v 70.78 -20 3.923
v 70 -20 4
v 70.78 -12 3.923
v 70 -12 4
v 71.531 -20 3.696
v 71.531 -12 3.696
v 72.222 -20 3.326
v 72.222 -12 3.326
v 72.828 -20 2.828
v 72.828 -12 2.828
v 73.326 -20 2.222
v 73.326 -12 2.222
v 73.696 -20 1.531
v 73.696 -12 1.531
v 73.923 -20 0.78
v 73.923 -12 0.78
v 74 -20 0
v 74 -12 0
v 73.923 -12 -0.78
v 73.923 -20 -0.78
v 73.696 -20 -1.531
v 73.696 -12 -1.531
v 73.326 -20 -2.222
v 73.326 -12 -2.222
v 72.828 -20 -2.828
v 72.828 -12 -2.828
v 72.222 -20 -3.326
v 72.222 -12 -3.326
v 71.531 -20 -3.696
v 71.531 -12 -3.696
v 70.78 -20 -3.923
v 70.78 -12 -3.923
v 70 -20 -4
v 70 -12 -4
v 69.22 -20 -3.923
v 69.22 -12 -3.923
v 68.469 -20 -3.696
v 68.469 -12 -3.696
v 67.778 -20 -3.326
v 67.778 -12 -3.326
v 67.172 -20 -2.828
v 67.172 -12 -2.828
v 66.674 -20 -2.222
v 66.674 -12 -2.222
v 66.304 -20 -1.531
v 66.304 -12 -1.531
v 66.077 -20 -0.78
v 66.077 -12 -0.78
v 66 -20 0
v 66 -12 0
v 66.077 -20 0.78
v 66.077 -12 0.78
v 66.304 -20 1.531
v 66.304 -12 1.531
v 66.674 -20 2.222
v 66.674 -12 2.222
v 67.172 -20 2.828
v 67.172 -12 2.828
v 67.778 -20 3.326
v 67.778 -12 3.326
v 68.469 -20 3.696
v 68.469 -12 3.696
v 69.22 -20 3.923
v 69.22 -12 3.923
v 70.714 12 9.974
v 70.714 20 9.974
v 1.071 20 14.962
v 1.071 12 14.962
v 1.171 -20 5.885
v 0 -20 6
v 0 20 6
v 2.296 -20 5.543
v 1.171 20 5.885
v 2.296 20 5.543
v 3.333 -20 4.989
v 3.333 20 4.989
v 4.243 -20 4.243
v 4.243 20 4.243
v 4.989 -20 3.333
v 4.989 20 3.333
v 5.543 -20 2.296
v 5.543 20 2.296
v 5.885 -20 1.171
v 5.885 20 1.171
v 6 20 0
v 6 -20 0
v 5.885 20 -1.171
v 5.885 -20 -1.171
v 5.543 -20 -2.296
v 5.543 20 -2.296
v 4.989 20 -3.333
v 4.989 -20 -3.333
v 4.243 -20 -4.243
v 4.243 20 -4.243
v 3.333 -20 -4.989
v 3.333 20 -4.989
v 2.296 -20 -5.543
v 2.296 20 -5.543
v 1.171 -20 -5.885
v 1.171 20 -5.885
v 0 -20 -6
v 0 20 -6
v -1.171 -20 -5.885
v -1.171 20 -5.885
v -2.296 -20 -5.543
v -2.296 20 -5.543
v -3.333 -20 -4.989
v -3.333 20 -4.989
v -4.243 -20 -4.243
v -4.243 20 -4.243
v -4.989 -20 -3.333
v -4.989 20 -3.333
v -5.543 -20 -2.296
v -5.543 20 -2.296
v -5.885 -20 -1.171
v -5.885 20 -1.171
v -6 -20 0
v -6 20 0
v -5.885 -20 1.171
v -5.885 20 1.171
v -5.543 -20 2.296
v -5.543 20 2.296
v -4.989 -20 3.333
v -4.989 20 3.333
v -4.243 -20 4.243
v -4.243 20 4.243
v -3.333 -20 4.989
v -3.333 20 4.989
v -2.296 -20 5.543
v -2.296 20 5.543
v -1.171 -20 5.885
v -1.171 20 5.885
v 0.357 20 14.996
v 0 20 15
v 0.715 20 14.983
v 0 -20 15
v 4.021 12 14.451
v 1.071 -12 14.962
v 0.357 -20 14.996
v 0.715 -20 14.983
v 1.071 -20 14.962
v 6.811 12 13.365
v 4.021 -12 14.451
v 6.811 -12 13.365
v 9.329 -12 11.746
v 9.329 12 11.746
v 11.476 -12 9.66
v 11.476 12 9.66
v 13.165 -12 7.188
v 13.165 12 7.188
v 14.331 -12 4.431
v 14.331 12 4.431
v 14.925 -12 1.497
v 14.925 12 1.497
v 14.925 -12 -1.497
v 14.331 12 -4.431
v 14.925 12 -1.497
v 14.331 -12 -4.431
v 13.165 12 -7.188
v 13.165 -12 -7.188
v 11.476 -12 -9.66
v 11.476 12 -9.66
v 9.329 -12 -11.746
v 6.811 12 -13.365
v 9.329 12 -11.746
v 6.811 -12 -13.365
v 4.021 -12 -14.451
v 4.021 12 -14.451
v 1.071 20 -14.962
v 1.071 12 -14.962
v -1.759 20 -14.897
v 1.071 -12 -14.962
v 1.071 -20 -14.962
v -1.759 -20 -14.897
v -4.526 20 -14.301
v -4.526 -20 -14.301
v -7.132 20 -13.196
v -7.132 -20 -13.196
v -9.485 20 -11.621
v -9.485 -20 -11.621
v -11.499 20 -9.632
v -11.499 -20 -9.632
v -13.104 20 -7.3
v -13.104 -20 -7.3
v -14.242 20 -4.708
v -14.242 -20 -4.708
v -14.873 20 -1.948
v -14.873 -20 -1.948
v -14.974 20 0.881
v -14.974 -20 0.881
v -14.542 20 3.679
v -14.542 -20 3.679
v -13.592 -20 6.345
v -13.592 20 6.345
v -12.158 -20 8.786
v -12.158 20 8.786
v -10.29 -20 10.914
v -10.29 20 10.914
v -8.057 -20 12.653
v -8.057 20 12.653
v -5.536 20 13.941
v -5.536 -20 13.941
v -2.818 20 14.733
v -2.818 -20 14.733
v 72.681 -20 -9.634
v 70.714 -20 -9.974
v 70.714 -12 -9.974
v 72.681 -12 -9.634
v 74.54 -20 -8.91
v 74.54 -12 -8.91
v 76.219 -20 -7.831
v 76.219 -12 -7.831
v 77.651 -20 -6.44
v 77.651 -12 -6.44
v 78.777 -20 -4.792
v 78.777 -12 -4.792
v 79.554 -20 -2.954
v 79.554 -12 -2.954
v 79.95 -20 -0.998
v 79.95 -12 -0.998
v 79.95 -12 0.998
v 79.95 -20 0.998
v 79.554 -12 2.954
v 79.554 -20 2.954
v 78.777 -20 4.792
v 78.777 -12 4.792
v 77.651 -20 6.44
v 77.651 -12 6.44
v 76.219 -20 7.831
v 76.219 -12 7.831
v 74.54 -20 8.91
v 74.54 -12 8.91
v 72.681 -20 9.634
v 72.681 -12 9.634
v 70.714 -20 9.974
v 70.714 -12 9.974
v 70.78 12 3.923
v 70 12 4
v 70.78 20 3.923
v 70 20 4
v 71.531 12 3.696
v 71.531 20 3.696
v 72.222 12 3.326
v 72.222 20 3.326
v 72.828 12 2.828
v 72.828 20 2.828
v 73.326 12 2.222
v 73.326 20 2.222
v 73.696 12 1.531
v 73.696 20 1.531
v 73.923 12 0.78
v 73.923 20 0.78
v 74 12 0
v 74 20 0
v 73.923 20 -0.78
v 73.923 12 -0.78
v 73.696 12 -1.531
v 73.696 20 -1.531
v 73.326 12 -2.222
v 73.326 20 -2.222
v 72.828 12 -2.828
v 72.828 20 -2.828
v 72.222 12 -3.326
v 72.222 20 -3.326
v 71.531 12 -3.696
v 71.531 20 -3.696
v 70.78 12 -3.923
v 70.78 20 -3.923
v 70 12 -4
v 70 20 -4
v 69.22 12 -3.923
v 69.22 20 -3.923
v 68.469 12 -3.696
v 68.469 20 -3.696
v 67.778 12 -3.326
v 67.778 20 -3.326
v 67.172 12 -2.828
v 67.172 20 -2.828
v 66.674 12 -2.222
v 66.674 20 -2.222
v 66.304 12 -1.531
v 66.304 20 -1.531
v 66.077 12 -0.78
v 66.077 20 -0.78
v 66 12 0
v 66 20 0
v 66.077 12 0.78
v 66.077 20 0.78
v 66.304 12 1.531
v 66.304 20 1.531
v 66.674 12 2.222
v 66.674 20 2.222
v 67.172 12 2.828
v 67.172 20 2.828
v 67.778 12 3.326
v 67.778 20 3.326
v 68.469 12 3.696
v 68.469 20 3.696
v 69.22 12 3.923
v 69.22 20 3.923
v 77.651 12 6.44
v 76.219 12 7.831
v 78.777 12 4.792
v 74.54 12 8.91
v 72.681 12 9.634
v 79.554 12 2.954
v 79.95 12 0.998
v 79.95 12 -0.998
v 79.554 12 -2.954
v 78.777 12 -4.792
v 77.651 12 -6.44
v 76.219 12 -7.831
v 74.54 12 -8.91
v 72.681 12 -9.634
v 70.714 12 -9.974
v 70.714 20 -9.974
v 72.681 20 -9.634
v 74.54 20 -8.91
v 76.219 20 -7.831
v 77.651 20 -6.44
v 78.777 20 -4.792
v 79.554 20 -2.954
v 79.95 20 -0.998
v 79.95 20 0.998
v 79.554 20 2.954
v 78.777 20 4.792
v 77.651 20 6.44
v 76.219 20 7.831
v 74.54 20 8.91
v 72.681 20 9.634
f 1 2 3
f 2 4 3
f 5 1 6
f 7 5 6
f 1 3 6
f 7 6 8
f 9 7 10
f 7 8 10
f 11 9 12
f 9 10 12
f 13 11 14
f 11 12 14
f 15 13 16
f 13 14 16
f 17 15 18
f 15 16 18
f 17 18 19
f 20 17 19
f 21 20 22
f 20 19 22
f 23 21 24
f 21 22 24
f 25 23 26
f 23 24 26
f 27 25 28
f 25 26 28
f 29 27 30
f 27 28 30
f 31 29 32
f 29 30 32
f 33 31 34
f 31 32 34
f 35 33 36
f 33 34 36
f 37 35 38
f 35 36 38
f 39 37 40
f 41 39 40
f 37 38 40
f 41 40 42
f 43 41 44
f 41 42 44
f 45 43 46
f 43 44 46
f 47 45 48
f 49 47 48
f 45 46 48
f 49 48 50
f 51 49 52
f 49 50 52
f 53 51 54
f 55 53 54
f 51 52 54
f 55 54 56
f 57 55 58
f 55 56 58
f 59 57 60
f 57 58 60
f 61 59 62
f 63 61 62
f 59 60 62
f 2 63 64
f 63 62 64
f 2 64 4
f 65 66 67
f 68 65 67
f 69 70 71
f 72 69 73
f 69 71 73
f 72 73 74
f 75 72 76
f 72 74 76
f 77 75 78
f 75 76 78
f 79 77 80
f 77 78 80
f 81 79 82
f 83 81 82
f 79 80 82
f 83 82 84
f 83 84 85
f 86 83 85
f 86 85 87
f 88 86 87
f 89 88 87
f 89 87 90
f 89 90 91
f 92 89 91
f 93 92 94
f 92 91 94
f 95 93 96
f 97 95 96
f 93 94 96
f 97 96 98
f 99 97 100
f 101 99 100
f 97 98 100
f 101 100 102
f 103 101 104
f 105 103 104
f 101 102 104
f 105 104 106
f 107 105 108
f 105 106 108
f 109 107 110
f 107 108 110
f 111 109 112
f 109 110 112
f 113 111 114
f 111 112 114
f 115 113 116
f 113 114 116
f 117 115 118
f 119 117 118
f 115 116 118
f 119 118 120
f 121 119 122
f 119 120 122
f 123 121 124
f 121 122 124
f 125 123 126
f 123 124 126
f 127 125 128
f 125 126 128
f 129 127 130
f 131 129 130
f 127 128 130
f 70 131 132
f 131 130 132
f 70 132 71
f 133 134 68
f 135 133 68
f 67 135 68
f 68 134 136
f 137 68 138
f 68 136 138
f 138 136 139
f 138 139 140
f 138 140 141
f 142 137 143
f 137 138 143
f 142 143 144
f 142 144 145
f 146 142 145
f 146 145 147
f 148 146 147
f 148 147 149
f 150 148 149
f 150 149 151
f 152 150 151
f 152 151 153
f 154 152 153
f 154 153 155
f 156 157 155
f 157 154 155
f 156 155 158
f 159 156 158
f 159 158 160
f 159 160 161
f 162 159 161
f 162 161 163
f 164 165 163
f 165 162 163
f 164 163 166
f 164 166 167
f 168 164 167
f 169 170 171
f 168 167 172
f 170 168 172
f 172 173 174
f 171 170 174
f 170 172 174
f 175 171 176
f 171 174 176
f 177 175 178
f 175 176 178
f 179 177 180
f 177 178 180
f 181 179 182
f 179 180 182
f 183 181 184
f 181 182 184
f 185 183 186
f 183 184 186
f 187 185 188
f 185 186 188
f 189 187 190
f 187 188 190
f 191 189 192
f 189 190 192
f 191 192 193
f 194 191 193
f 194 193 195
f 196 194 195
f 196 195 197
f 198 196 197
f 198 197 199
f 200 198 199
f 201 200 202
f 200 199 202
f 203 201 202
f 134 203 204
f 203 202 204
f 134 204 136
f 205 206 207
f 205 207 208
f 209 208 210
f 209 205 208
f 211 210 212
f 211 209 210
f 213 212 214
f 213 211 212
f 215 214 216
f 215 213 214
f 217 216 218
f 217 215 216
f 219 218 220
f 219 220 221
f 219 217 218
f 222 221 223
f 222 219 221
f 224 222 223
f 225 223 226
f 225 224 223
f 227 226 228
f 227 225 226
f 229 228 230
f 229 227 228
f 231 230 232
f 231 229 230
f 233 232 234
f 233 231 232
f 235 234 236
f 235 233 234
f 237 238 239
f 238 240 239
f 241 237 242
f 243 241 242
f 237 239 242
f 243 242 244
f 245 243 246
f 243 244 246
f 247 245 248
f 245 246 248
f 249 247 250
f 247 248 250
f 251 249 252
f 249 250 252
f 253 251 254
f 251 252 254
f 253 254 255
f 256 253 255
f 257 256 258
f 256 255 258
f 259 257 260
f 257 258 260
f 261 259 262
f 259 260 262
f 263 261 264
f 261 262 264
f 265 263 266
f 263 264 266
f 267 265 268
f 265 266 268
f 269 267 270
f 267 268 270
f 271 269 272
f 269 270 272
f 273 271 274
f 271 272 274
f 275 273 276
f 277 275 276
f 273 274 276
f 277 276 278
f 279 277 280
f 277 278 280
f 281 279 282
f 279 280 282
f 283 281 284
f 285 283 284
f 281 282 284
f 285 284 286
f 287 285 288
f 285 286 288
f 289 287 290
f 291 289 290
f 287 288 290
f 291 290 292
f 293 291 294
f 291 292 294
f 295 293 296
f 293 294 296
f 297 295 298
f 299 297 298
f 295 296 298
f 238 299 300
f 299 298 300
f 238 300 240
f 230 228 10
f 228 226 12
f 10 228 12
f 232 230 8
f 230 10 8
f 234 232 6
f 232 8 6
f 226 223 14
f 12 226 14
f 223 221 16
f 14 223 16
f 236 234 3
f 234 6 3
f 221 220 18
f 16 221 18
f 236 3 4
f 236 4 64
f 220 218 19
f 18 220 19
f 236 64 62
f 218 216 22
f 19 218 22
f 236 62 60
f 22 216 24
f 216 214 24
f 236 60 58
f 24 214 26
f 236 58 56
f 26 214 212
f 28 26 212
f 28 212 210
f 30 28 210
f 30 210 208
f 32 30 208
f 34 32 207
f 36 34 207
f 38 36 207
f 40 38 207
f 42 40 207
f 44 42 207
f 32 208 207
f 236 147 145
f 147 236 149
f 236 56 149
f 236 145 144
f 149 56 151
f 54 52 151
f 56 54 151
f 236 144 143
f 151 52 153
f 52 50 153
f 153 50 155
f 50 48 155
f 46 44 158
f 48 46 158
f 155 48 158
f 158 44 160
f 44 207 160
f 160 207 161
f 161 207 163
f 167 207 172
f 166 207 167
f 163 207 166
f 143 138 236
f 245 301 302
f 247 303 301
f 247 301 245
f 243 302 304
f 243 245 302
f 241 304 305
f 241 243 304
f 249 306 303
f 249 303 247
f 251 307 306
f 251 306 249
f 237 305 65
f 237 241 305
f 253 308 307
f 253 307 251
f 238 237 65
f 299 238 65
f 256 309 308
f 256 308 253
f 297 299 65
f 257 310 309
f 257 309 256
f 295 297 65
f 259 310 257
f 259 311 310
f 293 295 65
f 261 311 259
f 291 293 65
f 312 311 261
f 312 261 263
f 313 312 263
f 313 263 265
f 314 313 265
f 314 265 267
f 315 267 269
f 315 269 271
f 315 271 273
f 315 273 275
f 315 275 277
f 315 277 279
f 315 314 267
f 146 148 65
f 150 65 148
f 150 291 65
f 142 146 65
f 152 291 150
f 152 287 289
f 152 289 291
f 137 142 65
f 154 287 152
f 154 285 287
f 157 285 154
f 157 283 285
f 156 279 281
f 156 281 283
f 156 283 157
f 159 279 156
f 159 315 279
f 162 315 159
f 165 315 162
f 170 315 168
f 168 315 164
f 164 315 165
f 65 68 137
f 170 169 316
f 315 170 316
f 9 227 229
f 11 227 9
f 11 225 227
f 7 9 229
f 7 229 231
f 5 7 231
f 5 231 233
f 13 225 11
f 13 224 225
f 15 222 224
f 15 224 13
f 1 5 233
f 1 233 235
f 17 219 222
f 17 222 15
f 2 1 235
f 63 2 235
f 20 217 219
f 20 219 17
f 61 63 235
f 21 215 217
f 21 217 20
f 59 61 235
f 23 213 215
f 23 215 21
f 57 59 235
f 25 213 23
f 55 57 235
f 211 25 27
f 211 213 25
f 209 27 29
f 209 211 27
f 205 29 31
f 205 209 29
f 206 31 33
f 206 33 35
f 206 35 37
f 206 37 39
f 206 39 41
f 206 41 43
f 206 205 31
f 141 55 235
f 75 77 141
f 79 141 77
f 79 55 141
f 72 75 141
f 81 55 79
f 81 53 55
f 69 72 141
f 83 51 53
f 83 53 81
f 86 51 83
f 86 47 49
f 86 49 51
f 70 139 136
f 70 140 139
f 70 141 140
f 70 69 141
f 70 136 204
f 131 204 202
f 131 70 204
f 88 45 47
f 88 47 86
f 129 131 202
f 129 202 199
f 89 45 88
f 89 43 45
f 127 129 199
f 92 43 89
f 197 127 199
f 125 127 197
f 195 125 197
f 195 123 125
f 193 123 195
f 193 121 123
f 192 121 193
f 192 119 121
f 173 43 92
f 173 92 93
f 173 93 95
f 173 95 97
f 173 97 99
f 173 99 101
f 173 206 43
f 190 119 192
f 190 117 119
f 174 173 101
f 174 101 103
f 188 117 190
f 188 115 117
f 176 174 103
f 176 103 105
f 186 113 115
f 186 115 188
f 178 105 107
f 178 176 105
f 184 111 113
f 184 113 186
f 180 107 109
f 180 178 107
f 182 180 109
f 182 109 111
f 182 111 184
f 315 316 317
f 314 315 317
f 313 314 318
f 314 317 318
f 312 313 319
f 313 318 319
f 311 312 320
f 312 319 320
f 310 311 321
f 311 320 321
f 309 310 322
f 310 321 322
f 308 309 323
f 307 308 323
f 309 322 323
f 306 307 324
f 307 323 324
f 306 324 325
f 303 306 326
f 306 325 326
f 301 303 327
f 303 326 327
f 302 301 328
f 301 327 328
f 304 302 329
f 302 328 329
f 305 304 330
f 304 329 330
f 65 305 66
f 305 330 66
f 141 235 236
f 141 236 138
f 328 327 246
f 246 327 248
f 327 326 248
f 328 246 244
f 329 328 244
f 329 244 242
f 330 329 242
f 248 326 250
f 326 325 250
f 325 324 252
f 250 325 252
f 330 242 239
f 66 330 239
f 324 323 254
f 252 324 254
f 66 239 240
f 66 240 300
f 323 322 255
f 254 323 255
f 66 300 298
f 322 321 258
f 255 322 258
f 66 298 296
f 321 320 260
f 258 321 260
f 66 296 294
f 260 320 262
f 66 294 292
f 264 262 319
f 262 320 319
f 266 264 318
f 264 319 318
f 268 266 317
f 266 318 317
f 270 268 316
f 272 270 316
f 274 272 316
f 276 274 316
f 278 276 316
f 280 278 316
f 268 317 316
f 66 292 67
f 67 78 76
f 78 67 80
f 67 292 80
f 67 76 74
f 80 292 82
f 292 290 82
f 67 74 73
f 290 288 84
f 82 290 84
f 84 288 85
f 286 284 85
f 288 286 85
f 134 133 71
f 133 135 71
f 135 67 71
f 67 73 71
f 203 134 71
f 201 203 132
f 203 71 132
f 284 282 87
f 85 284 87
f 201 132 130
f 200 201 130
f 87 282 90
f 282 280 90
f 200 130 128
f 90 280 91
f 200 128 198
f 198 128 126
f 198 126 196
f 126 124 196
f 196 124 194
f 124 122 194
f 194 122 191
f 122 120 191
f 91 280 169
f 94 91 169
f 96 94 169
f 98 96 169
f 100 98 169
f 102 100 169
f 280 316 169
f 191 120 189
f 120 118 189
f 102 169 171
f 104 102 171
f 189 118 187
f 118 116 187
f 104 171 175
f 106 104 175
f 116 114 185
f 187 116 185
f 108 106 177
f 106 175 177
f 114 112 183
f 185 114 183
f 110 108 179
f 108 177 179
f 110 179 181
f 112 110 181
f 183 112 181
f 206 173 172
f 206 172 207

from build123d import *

# Parameters (mm, degrees)
SKETCH_1_R          = 15
EXTRUDE_1_DEPTH     = 40
EXTRUDE_2_DEPTH     = 8
SKETCH_3_R          = 6
CUT_EXTRUDE_1_DEPTH = 96
SKETCH_4_R          = 4
CUT_EXTRUDE_2_DEPTH = 96


with BuildPart() as part:
    # 草图1 → 凸台-拉伸1 (new body)
    with BuildSketch(Plane(origin=(0, -20, 0), x_dir=(1, 0, 0), z_dir=(0, 1, 0))):
        with Locations(Location((0, 0, 0), (0, 0, 270))):
            Circle(SKETCH_1_R)
    extrude(amount=EXTRUDE_1_DEPTH)

    # 草图2 → 凸台-拉伸2 (add)
    with BuildSketch(Plane(origin=(0, -20, 0), x_dir=(1, 0, 0), z_dir=(0, 1, 0))):
        with BuildLine():
            Line((1.071428571, 14.961685761), (70.714285714, 9.974457174))
            ThreePointArc((70.714285714, 9.974457174), (80, 0), (70.714285714, -9.974457174))
            Line((70.714285714, -9.974457174), (1.071428571, -14.961685761))
            ThreePointArc((1.071428571, -14.961685761), (-15, 0), (1.071428571, 14.961685761))
        make_face()
    extrude_2 = extrude(amount=EXTRUDE_2_DEPTH)

    # 镜向1: 凸台-拉伸2 across plane
    add(extrude_2.mirror(Plane.ZX))

    # 草图3 → 切除-拉伸1 (cut, symmetric)
    with BuildSketch(Plane(origin=(0, 0, 0), x_dir=(1, 0, 0), z_dir=(0, 1, 0))):
        with Locations(Location((0, 0, 0), (0, 0, 270))):
            Circle(SKETCH_3_R)
    extrude(amount=CUT_EXTRUDE_1_DEPTH, both=True, mode=Mode.SUBTRACT)

    # 草图4 → 切除-拉伸2 (cut, symmetric)
    with BuildSketch(Plane(origin=(0, 0, 0), x_dir=(1, 0, 0), z_dir=(0, 1, 0))):
        with Locations(Location((70, 0, 0), (0, 0, 270))):
            Circle(SKETCH_4_R)
    extrude(amount=CUT_EXTRUDE_2_DEPTH, both=True, mode=Mode.SUBTRACT)


solid = part.part
